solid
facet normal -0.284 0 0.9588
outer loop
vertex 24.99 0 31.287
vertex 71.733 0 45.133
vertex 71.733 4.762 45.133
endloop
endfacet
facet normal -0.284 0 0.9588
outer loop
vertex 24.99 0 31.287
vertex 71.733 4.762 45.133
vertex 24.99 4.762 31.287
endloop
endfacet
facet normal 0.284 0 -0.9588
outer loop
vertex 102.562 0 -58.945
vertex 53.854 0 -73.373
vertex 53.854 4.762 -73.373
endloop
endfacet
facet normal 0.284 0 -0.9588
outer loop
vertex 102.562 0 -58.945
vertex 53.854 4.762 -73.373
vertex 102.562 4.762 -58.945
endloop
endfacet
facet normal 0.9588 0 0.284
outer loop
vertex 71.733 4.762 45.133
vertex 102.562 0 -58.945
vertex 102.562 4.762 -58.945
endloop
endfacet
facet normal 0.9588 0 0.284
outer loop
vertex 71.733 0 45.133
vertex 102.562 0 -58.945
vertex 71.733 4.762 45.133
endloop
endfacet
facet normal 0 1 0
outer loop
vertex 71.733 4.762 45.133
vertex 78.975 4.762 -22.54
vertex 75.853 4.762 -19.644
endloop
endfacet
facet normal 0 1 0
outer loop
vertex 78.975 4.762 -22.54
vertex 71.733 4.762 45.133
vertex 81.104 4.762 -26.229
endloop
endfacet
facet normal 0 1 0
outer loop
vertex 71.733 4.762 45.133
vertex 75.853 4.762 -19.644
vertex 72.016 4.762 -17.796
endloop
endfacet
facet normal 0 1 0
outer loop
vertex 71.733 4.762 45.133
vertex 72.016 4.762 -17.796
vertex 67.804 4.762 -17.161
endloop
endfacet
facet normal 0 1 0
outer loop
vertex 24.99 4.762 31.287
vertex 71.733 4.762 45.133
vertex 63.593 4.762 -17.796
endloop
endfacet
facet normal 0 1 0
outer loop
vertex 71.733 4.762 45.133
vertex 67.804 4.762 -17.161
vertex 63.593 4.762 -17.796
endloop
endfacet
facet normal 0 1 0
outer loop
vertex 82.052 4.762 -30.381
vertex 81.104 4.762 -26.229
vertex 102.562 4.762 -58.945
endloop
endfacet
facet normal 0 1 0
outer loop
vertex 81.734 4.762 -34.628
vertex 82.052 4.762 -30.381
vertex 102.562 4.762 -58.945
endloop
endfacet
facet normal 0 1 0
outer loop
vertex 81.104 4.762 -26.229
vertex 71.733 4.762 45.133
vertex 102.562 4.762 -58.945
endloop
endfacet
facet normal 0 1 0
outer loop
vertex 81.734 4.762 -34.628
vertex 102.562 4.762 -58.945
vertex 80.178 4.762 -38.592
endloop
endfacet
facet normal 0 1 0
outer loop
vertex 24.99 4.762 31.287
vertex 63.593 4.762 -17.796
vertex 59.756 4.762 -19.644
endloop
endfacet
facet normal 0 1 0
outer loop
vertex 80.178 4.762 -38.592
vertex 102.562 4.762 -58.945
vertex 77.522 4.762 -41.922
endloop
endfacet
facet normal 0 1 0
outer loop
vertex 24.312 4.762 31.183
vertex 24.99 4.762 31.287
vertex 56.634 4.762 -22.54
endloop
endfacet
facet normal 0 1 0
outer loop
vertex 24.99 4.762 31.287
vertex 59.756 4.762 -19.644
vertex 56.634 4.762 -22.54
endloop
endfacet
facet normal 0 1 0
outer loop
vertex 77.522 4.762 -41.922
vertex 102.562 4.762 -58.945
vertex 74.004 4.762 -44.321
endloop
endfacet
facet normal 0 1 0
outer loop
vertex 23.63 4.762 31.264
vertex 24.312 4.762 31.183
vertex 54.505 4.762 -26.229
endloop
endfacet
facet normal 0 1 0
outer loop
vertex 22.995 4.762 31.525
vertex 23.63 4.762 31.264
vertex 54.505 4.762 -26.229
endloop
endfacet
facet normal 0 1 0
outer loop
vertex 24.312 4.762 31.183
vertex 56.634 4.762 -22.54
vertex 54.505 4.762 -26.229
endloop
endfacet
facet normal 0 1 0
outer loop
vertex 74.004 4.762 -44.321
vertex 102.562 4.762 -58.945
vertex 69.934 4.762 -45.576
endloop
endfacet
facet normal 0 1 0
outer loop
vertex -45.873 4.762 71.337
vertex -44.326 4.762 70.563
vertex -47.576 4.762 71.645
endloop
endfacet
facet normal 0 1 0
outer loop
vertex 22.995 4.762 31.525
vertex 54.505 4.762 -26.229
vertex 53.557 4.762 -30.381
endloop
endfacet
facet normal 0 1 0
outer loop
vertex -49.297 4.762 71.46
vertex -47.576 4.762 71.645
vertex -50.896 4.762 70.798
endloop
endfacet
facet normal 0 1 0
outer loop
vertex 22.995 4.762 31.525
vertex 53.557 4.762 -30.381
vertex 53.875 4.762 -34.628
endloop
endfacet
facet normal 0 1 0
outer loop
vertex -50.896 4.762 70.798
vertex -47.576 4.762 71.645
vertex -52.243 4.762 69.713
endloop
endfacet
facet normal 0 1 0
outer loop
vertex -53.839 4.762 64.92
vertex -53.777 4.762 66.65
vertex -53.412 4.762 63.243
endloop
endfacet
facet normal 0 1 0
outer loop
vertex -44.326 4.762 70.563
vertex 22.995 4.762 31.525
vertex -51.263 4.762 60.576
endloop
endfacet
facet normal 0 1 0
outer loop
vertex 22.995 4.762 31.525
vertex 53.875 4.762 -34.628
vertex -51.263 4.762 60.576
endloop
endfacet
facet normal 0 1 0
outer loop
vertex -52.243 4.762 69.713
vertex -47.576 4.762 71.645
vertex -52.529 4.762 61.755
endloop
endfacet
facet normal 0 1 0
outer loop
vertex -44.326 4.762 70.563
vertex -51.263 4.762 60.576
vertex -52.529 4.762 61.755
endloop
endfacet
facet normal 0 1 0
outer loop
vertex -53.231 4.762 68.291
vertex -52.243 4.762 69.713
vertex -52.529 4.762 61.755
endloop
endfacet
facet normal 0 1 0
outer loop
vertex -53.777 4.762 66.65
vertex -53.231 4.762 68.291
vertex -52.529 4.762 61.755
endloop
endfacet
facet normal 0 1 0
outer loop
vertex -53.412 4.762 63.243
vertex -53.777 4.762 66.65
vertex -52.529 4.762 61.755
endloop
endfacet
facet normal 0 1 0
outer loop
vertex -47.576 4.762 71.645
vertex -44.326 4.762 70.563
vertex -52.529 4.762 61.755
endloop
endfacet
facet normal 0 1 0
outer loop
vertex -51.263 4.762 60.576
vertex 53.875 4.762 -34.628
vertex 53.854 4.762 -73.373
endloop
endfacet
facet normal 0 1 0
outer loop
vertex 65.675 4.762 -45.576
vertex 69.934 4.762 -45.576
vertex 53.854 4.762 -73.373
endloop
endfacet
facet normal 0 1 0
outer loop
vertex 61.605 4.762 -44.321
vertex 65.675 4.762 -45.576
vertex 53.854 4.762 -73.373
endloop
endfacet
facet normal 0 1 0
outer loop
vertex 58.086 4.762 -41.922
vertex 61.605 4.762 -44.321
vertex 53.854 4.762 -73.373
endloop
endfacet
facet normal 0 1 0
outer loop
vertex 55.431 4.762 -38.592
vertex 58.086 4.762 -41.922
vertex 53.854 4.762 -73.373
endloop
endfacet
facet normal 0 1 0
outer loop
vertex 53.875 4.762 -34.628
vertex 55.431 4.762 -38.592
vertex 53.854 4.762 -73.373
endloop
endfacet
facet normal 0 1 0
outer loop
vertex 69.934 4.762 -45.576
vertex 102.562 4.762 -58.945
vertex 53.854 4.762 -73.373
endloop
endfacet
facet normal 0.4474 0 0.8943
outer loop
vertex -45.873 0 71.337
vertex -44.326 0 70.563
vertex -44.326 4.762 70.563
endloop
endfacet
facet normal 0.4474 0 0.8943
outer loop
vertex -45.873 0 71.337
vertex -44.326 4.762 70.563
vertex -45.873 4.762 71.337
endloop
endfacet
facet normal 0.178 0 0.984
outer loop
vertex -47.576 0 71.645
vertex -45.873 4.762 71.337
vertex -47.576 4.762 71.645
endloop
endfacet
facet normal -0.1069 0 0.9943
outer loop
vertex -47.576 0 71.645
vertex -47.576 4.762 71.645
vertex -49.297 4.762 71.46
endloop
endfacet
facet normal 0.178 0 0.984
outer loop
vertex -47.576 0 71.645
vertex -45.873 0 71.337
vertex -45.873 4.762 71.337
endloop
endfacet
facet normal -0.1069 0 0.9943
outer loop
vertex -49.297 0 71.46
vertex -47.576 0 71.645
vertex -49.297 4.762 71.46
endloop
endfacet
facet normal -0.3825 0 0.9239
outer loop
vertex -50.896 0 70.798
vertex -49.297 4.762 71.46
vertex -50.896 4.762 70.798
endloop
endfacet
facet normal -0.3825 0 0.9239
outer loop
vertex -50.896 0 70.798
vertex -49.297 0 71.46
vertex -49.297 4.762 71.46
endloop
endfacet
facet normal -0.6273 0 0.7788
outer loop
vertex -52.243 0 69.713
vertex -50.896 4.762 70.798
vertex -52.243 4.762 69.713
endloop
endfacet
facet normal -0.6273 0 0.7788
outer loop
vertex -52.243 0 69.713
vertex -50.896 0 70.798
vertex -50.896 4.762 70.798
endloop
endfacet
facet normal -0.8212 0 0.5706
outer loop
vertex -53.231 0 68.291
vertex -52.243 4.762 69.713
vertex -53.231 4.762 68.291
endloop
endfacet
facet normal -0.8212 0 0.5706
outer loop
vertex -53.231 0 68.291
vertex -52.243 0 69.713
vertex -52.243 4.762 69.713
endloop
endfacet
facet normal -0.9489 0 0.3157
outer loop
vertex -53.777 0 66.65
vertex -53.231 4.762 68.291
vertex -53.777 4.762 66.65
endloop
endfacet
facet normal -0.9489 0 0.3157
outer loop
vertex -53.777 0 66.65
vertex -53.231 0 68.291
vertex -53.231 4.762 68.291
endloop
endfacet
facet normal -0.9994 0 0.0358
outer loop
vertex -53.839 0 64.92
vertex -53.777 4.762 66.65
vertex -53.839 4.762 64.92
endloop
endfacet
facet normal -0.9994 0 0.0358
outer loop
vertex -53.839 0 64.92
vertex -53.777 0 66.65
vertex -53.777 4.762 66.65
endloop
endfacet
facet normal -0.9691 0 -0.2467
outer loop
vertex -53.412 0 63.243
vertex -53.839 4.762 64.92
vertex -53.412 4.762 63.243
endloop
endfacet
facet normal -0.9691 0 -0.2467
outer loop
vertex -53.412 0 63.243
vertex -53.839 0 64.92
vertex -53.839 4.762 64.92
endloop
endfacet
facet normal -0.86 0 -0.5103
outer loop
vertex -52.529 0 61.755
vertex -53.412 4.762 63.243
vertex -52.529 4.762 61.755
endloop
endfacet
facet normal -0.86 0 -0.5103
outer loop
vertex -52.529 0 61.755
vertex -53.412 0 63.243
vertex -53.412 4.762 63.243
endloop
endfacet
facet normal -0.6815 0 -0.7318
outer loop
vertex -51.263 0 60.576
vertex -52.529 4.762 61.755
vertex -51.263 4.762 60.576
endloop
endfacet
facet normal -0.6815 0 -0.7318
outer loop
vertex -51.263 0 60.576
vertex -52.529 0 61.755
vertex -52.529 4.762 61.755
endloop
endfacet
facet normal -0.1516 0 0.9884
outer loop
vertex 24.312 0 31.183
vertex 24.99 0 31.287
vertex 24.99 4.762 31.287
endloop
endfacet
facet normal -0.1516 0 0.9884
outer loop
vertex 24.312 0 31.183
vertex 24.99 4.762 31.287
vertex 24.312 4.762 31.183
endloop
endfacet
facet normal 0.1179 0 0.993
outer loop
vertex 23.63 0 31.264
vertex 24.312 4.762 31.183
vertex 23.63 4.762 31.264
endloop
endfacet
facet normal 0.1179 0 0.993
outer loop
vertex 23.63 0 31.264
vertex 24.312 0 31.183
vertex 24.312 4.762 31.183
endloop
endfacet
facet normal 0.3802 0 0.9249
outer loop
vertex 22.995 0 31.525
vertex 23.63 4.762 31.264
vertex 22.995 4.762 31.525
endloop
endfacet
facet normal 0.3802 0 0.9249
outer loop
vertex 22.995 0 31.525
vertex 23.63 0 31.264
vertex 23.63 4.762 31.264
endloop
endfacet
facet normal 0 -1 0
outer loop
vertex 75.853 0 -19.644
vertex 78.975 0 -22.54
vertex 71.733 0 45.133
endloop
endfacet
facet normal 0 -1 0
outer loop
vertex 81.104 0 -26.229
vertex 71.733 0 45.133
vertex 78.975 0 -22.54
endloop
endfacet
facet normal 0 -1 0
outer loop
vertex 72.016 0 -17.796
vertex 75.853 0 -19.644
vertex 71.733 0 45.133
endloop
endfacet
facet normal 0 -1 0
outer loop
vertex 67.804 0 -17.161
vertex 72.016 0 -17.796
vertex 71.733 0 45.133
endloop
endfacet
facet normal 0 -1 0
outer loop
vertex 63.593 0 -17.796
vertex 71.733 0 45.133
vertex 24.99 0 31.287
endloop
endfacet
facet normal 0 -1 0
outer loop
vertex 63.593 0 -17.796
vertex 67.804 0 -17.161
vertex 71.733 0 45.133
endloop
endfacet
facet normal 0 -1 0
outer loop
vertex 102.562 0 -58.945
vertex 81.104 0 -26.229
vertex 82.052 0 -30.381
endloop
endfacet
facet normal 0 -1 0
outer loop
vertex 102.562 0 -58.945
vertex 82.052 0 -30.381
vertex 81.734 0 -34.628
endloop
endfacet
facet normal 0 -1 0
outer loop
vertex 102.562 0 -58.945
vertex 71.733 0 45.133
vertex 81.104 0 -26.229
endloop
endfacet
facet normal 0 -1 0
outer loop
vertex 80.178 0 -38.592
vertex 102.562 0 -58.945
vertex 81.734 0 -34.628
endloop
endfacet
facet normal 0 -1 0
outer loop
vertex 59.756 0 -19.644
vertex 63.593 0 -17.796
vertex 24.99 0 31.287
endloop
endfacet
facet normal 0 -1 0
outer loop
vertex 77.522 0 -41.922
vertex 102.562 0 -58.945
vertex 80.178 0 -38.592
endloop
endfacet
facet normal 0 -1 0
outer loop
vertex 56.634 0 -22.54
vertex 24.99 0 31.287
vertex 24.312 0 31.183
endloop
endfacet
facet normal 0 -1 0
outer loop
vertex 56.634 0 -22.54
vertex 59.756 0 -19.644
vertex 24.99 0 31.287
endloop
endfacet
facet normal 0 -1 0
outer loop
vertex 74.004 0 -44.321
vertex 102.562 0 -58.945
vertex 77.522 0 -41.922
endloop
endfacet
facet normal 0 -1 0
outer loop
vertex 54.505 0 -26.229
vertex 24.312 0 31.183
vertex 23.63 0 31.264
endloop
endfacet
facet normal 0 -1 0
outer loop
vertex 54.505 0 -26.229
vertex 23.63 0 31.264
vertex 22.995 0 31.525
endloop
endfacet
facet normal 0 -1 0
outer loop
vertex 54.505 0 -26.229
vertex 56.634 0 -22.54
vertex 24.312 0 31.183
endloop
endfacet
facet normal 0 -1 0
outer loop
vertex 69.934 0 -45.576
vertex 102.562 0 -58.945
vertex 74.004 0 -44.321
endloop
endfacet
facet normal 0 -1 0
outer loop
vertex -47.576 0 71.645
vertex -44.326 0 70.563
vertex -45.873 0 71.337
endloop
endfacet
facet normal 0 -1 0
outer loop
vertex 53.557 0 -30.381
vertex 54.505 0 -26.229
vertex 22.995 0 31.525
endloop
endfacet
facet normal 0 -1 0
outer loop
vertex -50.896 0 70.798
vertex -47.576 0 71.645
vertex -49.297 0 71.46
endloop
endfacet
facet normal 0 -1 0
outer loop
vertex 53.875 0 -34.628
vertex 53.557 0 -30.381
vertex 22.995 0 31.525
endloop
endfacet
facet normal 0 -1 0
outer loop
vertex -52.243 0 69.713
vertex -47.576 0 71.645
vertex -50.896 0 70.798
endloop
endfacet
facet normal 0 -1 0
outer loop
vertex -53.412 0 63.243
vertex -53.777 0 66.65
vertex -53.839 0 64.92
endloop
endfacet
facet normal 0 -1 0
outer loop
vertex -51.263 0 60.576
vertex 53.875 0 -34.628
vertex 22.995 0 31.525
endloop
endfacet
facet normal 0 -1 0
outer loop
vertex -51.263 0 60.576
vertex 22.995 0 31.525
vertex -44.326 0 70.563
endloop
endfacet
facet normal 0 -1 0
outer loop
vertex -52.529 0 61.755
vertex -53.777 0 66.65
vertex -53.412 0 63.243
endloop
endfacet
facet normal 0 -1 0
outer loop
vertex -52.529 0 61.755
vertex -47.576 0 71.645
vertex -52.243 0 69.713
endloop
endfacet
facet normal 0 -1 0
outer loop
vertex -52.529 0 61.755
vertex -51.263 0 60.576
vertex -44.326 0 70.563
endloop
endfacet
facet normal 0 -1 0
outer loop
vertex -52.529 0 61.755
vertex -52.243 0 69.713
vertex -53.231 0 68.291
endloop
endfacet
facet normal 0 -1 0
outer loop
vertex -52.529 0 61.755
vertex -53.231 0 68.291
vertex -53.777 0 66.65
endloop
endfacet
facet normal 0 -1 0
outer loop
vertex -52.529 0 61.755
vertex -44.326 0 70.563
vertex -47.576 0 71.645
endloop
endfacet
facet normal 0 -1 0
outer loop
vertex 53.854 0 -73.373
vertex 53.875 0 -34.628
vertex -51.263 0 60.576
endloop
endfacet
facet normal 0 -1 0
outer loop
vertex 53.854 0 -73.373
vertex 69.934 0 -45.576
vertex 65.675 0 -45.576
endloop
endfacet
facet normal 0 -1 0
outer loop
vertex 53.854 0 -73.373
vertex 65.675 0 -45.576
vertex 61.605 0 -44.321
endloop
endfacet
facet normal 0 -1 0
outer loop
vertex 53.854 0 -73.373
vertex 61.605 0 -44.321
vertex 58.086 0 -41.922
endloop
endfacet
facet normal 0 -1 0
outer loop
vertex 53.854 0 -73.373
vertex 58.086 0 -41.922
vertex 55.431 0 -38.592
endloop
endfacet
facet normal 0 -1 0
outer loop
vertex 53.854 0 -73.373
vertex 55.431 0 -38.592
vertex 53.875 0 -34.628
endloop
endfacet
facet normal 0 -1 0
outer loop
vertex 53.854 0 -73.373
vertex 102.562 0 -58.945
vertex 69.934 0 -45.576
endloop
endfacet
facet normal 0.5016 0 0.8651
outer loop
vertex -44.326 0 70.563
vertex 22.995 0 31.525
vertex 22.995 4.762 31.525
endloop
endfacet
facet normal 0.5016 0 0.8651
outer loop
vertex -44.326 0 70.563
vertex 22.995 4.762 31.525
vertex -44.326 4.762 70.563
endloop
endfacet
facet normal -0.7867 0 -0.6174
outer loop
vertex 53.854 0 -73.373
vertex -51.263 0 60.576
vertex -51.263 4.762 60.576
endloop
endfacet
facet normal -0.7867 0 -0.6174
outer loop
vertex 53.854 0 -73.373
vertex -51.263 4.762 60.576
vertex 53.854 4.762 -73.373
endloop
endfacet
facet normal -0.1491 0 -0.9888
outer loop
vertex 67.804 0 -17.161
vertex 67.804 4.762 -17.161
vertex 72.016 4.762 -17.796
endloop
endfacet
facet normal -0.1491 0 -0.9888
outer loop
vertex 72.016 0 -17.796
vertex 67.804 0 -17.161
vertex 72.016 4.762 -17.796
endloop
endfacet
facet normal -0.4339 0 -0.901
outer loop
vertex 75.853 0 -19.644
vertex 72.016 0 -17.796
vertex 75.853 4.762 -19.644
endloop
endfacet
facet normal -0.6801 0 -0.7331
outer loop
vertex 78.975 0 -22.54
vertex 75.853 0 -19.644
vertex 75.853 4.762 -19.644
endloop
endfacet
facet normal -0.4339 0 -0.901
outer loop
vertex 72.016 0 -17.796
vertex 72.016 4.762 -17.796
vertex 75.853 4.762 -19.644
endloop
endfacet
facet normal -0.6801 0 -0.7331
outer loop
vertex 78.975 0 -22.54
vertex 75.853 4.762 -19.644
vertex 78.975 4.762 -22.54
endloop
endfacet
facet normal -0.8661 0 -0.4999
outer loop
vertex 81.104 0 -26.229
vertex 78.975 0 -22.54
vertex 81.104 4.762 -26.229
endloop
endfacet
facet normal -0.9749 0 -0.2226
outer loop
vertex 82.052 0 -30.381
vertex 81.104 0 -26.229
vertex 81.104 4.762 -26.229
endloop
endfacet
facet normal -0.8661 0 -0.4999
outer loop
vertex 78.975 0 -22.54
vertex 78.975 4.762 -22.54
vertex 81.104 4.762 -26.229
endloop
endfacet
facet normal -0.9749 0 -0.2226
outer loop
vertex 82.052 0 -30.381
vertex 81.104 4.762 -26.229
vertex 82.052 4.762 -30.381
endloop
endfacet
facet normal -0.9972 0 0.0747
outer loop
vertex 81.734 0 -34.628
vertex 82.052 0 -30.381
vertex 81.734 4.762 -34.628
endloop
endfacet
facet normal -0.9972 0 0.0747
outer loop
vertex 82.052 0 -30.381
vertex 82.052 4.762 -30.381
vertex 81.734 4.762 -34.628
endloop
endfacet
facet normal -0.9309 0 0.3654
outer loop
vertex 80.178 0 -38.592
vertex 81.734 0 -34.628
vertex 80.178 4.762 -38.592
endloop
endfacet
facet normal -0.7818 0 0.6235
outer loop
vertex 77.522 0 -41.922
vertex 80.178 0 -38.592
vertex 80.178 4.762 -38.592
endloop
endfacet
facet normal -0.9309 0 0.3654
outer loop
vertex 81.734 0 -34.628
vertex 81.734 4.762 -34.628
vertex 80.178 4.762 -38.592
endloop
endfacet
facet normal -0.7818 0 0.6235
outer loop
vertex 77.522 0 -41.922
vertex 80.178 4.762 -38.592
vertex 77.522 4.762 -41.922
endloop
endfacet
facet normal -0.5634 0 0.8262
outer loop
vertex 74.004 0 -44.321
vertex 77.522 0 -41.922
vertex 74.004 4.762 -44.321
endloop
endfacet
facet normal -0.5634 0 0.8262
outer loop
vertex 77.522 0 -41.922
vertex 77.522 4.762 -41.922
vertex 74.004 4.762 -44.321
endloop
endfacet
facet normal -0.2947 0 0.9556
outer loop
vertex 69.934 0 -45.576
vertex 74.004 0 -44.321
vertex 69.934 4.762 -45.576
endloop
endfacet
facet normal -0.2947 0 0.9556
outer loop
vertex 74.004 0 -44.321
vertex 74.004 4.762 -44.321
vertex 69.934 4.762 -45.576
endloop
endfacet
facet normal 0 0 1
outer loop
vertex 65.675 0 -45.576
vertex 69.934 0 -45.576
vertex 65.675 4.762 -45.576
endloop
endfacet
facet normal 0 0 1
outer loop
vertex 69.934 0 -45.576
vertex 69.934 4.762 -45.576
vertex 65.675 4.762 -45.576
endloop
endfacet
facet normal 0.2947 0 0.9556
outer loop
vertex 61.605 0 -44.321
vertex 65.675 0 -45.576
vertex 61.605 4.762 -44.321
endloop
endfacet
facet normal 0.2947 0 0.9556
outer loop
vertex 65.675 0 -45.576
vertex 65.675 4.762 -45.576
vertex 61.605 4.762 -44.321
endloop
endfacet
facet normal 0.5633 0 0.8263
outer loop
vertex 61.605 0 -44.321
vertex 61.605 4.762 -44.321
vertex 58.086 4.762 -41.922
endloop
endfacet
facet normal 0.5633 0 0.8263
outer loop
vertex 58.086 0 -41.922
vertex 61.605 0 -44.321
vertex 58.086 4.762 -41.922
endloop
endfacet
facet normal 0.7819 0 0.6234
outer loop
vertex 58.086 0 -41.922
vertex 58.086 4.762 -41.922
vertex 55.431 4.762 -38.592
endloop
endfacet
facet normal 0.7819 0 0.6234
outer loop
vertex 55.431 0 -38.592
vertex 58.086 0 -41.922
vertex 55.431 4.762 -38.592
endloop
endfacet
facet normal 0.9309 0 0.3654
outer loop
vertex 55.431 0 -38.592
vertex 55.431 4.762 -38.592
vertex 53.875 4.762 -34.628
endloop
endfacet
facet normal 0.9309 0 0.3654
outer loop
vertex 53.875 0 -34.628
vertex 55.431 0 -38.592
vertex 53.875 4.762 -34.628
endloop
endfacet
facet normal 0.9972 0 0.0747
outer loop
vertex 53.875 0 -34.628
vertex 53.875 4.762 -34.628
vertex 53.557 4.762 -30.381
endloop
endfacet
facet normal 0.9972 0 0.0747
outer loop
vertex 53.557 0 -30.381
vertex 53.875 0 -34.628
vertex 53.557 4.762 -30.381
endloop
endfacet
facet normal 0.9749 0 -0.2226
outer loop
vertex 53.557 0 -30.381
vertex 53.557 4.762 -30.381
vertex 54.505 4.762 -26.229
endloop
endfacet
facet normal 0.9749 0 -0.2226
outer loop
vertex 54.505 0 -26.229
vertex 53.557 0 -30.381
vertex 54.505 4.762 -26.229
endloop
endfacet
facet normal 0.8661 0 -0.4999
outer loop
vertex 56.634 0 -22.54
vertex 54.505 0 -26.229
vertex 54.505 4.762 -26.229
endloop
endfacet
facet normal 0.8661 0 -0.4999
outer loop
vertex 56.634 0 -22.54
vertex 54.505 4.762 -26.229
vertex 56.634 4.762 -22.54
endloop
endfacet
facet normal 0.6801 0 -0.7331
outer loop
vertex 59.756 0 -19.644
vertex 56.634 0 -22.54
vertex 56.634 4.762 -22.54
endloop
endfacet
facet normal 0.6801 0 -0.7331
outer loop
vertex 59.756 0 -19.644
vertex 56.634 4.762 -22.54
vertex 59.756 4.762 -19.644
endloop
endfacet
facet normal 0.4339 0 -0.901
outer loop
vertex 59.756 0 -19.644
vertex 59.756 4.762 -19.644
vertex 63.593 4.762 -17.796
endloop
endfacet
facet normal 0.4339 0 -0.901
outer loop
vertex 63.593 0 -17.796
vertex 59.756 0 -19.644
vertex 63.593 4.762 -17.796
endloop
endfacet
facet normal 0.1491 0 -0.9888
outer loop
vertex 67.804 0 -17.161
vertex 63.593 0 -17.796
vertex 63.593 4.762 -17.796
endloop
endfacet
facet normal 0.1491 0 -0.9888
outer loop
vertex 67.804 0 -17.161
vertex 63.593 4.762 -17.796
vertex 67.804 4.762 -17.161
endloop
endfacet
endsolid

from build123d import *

# Parameters (mm, degrees)
BOSS_EXTRUDE1_DEPTH = 4.7625
SKETCH2_R           = 14.2875
CUT_EXTRUDE1_DEPTH  = 127.195863524


with BuildPart() as part:
    # Sketch1 → Boss-Extrude1 (new body)
    with BuildSketch(Plane(origin=(0, 0, 0), x_dir=(1, 0, 0), z_dir=(0, 1, 0))):
        with BuildLine():
            Line((53.854446853, 73.373362576), (102.562489384, 58.945383065))
            Line((102.562489384, 58.945383065), (71.73313232, -45.132782137))
            Line((71.73313232, -45.132782137), (24.990181224, -31.286889228))
            ThreePointArc((24.990181224, -31.286889228), (23.967852385, -31.200180886), (22.994624733, -31.524992416))
            Line((22.994624733, -31.524992416), (-44.326137807, -70.562582621))
            ThreePointArc((-44.326137807, -70.562582621), (-52.787800823, -69.037356261), (-51.262574464, -60.575693244))
            Line((-51.262574464, -60.575693244), (53.854446853, 73.373362576))
        make_face()
    extrude(amount=BOSS_EXTRUDE1_DEPTH)

    # Sketch2 → Cut-Extrude1 (cut, through all)
    with BuildSketch(Plane(origin=(0, 4.7625, 0), x_dir=(1, 0, 0), z_dir=(0, 1, 0))):
        with Locations(Location((67.804408175, 31.44842364, 0), (0, 0, 270))):
            Circle(SKETCH2_R)
    extrude(amount=-CUT_EXTRUDE1_DEPTH, mode=Mode.SUBTRACT)


solid = part.part
